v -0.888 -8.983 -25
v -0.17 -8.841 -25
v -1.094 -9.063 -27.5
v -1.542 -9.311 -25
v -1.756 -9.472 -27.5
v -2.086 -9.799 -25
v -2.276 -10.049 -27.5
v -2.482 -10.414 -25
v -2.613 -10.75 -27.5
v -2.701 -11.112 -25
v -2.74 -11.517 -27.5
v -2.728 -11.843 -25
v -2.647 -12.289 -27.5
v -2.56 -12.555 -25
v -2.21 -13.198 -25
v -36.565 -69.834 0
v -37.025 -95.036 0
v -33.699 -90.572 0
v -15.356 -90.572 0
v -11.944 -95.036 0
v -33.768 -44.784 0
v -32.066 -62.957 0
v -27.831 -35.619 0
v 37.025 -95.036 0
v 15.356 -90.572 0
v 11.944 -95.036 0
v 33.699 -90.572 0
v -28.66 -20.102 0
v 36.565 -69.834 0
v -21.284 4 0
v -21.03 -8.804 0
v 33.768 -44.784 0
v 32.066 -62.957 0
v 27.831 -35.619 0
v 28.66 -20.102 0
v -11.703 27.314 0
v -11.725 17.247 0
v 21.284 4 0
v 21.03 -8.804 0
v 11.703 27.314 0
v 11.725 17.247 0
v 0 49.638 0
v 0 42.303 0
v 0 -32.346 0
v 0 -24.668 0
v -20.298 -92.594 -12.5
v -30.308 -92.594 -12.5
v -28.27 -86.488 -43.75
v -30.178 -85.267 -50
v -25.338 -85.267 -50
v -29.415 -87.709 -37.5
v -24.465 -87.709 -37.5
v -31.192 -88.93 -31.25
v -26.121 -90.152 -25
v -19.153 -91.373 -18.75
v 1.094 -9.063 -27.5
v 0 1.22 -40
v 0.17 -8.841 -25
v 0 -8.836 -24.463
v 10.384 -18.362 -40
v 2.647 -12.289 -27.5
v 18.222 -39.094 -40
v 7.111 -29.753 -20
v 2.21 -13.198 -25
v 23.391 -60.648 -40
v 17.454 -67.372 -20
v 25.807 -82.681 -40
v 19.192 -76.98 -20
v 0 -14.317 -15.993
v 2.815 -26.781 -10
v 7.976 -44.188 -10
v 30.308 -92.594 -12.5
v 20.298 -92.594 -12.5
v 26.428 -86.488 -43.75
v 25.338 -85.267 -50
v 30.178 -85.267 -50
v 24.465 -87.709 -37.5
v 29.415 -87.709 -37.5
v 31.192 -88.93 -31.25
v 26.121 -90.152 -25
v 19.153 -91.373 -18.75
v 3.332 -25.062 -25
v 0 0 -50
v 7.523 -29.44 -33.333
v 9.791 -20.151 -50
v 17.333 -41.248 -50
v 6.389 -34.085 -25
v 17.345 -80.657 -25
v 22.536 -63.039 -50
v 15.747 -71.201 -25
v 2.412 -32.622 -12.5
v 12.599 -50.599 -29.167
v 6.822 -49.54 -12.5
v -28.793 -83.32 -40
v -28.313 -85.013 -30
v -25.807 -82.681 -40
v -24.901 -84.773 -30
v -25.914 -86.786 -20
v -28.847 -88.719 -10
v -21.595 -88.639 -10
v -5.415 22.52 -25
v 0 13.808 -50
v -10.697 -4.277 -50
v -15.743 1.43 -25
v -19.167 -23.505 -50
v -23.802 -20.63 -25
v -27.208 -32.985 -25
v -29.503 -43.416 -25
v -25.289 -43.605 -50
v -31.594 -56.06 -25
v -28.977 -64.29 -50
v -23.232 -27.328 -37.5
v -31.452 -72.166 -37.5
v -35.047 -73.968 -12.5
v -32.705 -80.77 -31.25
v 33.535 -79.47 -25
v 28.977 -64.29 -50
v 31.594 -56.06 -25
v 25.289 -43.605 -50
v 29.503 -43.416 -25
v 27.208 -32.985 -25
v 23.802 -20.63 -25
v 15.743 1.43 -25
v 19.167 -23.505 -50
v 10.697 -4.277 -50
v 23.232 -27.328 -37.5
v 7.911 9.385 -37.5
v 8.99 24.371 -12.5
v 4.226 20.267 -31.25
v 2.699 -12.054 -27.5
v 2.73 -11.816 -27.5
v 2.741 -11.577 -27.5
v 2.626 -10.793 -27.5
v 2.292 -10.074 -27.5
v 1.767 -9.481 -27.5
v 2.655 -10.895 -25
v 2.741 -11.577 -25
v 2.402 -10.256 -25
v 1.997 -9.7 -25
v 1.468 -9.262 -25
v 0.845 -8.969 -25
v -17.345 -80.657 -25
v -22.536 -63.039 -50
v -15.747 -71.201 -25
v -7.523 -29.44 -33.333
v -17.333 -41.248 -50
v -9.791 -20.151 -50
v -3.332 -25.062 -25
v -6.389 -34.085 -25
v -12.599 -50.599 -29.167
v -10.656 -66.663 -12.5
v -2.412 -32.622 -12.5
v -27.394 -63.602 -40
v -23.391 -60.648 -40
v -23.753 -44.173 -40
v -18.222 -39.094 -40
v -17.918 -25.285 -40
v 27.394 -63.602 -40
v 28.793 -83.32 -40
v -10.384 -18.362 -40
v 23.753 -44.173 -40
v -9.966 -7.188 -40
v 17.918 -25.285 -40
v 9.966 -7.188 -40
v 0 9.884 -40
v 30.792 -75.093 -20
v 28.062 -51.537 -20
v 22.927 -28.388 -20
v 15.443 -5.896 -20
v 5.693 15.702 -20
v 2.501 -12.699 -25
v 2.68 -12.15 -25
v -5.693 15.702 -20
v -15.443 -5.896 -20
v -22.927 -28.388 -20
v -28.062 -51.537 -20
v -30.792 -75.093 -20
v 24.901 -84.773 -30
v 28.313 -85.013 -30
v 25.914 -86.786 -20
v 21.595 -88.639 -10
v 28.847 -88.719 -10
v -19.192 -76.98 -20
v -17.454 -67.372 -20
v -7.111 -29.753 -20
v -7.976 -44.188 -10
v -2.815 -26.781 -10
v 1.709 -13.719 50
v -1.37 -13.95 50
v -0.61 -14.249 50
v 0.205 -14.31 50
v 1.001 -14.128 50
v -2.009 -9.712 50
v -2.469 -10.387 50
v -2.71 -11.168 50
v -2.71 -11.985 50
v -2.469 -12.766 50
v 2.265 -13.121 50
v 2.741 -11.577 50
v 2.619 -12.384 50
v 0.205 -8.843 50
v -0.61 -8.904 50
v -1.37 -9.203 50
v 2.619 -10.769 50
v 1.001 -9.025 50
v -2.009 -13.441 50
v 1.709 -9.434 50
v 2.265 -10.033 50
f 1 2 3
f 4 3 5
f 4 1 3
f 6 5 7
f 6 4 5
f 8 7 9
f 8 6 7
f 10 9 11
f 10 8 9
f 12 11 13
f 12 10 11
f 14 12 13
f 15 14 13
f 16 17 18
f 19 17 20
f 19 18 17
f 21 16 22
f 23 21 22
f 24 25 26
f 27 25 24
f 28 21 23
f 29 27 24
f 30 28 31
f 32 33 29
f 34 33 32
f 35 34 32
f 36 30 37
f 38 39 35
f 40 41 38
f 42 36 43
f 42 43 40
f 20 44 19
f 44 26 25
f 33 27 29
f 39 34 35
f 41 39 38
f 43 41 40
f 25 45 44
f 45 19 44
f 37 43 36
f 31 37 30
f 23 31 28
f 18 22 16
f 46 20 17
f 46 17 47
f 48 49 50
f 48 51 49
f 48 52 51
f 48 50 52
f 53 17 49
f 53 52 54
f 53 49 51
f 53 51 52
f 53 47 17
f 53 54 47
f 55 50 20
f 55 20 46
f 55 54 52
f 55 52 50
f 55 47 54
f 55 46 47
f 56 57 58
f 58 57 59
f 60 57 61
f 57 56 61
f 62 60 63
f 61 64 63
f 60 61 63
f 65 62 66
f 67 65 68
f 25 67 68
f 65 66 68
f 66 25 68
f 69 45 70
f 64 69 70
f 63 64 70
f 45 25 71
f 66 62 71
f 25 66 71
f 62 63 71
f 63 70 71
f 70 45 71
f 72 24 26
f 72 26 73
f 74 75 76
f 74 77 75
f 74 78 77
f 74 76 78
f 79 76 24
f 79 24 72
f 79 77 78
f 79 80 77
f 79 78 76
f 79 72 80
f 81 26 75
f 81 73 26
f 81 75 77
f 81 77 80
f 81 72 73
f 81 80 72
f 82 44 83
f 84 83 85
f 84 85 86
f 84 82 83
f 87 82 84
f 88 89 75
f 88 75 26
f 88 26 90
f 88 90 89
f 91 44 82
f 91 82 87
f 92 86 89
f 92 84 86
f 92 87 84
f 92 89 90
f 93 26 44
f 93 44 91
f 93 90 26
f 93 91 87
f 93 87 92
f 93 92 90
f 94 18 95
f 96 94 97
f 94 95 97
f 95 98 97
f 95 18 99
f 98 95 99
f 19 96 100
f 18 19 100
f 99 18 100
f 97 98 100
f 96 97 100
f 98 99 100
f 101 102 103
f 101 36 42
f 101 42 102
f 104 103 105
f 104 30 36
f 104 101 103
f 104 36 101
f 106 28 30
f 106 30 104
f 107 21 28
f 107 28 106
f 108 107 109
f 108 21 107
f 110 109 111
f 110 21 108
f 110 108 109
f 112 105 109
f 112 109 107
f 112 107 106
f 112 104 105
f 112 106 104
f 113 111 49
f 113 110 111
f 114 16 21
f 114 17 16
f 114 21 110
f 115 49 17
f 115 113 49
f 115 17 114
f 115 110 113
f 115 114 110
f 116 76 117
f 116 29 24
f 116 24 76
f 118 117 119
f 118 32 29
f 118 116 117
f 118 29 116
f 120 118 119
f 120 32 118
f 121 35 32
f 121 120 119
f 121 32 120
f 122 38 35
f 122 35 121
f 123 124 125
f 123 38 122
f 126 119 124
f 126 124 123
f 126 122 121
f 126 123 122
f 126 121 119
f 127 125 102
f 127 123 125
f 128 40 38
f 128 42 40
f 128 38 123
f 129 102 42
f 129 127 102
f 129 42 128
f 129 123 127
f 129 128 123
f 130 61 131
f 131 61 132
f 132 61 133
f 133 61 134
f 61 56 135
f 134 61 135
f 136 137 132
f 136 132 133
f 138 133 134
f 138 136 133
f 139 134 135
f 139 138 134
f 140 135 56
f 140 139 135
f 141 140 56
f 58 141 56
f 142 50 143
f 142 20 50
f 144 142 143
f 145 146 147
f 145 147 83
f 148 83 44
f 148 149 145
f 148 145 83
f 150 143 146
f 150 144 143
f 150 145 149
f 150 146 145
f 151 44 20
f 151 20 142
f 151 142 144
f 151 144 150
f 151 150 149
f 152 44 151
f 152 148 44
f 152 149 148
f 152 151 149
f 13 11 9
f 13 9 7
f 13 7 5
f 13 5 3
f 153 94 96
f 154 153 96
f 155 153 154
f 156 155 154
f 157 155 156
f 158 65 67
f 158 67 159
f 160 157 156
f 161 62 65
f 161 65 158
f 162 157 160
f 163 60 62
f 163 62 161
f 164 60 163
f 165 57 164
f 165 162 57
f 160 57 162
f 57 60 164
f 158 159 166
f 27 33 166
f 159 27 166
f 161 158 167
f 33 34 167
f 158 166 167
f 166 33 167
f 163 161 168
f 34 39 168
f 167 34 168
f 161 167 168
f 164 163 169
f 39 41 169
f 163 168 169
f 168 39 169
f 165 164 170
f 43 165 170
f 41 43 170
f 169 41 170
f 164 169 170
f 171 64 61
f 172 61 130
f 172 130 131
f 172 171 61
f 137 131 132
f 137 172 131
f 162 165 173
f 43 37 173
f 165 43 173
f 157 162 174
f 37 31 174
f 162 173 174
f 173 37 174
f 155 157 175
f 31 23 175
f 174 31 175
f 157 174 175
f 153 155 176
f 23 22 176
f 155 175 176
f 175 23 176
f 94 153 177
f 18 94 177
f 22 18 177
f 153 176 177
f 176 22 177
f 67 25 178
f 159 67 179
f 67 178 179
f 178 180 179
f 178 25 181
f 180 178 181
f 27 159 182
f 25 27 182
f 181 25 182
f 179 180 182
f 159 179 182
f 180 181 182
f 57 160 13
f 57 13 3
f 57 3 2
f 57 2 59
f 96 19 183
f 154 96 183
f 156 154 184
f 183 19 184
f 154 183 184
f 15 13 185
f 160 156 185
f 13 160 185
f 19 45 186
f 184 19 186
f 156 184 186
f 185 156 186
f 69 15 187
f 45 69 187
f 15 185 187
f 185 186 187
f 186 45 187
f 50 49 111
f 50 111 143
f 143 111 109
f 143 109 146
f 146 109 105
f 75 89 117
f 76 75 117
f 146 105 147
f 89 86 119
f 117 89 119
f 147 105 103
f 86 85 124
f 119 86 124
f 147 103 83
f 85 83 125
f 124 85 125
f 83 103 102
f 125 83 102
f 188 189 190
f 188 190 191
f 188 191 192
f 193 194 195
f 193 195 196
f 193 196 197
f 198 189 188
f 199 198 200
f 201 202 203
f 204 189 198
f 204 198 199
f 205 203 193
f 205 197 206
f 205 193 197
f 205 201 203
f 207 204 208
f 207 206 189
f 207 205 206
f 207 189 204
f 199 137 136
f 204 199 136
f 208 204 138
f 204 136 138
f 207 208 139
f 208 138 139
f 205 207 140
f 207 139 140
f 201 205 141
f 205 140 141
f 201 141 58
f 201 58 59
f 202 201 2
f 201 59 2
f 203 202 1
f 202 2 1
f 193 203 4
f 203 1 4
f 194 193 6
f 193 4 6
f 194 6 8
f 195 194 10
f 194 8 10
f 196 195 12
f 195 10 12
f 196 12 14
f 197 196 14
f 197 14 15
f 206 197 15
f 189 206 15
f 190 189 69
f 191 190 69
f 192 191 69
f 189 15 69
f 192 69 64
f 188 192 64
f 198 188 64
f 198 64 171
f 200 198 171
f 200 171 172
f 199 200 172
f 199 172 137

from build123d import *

# Parameters (mm, degrees)
F9_R      = 2.740867
F10_DEPTH = 75
F11_DEPTH = 2.5


with BuildPart() as f3:
    # F2 (on offset) → F3 section 0
    with BuildSketch(Plane.XY.offset(-50)):
        with BuildLine():
            ThreePointArc((30.178057, -85.267261), (22.527556, -33.46393), (0, 13.807885))
            ThreePointArc((0, 13.807885), (-22.527556, -33.46393), (-30.178057, -85.267261))
            Line((-30.178057, -85.267261), (-25.33818, -85.267261))
            ThreePointArc((-25.33818, -85.267261), (-17.332774, -41.247761), (0, 0))
            ThreePointArc((0, 0), (17.332774, -41.247761), (25.33818, -85.267261))
            Line((25.33818, -85.267261), (30.178057, -85.267261))
        make_face()
    # F0 (on Top) → F3 section 1
    with BuildSketch(Plane.XY):
        with BuildLine():
            Line((11.943851, -95.035806), (37.024528, -95.035806))
            ThreePointArc((37.024528, -95.035806), (28.659989, -20.101697), (0, 49.638472))
            ThreePointArc((0, 49.638472), (-28.659989, -20.101697), (-37.024528, -95.035806))
            Line((-37.024528, -95.035806), (-11.943851, -95.035806))
            Line((-11.943851, -95.035806), (0, -32.345828))
            Line((0, -32.345828), (11.943851, -95.035806))
        make_face()
    loft()

    # F6 (on offset) → F7 section 0
    with BuildSketch(Plane.XY.offset(-40)):
        with BuildLine():
            ThreePointArc((28.793208, -83.320476), (21.105687, -34.645532), (0, 9.884212))
            ThreePointArc((0, 9.884212), (-21.105687, -34.645532), (-28.793208, -83.320476))
            Line((-28.793208, -83.320476), (-25.807247, -82.68062))
            ThreePointArc((-25.807247, -82.68062), (-18.222281, -39.094475), (0, 1.219694))
            ThreePointArc((0, 1.219694), (18.222281, -39.094475), (25.807247, -82.68062))
            Line((25.807247, -82.68062), (28.793208, -83.320476))
        make_face()
    # F4 (on Top) → F7 section 1
    with BuildSketch(Plane.XY):
        with BuildLine():
            Line((15.356379, -90.572096), (33.698723, -90.572096))
            ThreePointArc((33.698723, -90.572096), (24.74767, -22.13133), (0, 42.303231))
            ThreePointArc((0, 42.303231), (-24.74767, -22.13133), (-33.698723, -90.572096))
            Line((-33.698723, -90.572096), (-15.356379, -90.572096))
            Line((-15.356379, -90.572096), (0, -24.667639))
            Line((0, -24.667639), (15.356379, -90.572096))
        make_face()
    loft(mode=Mode.SUBTRACT)

    # F9 (on offset) → F10 (join)
    with BuildSketch(Plane.XY.offset(-25)):
        with Locations((0, -11.576544)):
            Circle(F9_R)
    extrude(amount=F10_DEPTH)

    # F9 (on offset) → F11 (join)
    with BuildSketch(Plane.XY.offset(-25)):
        with Locations((0, -11.576544)):
            Circle(F9_R)
    extrude(amount=-F11_DEPTH)


solid = f3.part
